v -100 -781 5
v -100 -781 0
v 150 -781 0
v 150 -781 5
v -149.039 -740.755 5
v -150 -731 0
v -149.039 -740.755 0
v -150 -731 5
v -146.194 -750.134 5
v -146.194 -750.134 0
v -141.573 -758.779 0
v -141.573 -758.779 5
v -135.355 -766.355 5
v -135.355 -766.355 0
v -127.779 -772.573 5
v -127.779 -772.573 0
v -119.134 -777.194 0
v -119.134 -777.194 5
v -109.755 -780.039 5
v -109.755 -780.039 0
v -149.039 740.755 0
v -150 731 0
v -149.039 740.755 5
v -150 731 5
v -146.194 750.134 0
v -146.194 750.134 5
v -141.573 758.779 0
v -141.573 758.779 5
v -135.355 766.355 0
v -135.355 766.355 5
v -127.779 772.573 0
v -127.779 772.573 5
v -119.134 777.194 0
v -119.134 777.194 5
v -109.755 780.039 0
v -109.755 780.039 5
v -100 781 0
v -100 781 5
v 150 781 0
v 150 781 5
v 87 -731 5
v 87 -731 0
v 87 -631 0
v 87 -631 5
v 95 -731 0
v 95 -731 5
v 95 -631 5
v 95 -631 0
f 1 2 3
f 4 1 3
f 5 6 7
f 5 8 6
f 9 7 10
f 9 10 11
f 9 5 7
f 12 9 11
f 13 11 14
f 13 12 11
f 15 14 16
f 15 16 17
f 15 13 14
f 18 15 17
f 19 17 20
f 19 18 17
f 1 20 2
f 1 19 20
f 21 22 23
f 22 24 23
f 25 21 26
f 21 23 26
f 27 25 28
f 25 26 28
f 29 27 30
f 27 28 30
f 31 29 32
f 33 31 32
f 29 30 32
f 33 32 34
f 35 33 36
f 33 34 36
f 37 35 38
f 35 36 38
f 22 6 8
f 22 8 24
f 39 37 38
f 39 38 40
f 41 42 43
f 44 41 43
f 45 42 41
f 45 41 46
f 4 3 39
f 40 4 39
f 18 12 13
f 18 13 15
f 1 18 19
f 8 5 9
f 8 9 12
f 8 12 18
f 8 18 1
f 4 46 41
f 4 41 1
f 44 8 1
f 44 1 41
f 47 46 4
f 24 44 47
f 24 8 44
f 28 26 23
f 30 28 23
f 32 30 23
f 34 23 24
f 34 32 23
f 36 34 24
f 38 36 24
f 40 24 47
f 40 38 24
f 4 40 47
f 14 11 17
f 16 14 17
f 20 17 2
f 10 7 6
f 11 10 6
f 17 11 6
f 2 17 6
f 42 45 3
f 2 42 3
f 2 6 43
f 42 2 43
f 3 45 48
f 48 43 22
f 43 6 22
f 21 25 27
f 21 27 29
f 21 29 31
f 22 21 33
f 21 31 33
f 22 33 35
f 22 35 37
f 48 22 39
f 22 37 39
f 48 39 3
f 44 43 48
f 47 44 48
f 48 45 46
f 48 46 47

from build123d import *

# Parameters (mm, degrees)
SKETCH_1_W               = 300
SKETCH_1_H               = 1562
EXTRUDE_1_DEPTH          = 5
FILLET_1_R               = 50
CUT_EXTRUDE_1_DEPTH      = 796.289884256
CUT_EXTRUDE_1_DEPTH_BACK = 796.289884256
SKETCH_2_W               = 8
SKETCH_2_H               = 100


with BuildPart() as part:
    # Эскиз1 → Бобышка-Вытянуть1 (new body)
    with BuildSketch(Plane.XY):
        Rectangle(SKETCH_1_W, SKETCH_1_H)
    extrude(amount=EXTRUDE_1_DEPTH)

    # Скругление1
    fillet_1_edges = [part.edges().sort_by_distance(p)[0] for p in [
        (-150, -781, 2.5),
        (-150, 781, 2.5),
    ]]
    fillet(fillet_1_edges, radius=FILLET_1_R)

    # Эскиз2 → Вырез-Вытянуть1 (cut, two sides: drawn at the far end of the back side and taken through both)
    with BuildSketch(Plane.XY.offset(5).offset(-CUT_EXTRUDE_1_DEPTH_BACK)):
        with Locations((91, -681)):
            Rectangle(SKETCH_2_W, SKETCH_2_H)
    extrude(amount=CUT_EXTRUDE_1_DEPTH + CUT_EXTRUDE_1_DEPTH_BACK, mode=Mode.SUBTRACT)


solid = part.part
